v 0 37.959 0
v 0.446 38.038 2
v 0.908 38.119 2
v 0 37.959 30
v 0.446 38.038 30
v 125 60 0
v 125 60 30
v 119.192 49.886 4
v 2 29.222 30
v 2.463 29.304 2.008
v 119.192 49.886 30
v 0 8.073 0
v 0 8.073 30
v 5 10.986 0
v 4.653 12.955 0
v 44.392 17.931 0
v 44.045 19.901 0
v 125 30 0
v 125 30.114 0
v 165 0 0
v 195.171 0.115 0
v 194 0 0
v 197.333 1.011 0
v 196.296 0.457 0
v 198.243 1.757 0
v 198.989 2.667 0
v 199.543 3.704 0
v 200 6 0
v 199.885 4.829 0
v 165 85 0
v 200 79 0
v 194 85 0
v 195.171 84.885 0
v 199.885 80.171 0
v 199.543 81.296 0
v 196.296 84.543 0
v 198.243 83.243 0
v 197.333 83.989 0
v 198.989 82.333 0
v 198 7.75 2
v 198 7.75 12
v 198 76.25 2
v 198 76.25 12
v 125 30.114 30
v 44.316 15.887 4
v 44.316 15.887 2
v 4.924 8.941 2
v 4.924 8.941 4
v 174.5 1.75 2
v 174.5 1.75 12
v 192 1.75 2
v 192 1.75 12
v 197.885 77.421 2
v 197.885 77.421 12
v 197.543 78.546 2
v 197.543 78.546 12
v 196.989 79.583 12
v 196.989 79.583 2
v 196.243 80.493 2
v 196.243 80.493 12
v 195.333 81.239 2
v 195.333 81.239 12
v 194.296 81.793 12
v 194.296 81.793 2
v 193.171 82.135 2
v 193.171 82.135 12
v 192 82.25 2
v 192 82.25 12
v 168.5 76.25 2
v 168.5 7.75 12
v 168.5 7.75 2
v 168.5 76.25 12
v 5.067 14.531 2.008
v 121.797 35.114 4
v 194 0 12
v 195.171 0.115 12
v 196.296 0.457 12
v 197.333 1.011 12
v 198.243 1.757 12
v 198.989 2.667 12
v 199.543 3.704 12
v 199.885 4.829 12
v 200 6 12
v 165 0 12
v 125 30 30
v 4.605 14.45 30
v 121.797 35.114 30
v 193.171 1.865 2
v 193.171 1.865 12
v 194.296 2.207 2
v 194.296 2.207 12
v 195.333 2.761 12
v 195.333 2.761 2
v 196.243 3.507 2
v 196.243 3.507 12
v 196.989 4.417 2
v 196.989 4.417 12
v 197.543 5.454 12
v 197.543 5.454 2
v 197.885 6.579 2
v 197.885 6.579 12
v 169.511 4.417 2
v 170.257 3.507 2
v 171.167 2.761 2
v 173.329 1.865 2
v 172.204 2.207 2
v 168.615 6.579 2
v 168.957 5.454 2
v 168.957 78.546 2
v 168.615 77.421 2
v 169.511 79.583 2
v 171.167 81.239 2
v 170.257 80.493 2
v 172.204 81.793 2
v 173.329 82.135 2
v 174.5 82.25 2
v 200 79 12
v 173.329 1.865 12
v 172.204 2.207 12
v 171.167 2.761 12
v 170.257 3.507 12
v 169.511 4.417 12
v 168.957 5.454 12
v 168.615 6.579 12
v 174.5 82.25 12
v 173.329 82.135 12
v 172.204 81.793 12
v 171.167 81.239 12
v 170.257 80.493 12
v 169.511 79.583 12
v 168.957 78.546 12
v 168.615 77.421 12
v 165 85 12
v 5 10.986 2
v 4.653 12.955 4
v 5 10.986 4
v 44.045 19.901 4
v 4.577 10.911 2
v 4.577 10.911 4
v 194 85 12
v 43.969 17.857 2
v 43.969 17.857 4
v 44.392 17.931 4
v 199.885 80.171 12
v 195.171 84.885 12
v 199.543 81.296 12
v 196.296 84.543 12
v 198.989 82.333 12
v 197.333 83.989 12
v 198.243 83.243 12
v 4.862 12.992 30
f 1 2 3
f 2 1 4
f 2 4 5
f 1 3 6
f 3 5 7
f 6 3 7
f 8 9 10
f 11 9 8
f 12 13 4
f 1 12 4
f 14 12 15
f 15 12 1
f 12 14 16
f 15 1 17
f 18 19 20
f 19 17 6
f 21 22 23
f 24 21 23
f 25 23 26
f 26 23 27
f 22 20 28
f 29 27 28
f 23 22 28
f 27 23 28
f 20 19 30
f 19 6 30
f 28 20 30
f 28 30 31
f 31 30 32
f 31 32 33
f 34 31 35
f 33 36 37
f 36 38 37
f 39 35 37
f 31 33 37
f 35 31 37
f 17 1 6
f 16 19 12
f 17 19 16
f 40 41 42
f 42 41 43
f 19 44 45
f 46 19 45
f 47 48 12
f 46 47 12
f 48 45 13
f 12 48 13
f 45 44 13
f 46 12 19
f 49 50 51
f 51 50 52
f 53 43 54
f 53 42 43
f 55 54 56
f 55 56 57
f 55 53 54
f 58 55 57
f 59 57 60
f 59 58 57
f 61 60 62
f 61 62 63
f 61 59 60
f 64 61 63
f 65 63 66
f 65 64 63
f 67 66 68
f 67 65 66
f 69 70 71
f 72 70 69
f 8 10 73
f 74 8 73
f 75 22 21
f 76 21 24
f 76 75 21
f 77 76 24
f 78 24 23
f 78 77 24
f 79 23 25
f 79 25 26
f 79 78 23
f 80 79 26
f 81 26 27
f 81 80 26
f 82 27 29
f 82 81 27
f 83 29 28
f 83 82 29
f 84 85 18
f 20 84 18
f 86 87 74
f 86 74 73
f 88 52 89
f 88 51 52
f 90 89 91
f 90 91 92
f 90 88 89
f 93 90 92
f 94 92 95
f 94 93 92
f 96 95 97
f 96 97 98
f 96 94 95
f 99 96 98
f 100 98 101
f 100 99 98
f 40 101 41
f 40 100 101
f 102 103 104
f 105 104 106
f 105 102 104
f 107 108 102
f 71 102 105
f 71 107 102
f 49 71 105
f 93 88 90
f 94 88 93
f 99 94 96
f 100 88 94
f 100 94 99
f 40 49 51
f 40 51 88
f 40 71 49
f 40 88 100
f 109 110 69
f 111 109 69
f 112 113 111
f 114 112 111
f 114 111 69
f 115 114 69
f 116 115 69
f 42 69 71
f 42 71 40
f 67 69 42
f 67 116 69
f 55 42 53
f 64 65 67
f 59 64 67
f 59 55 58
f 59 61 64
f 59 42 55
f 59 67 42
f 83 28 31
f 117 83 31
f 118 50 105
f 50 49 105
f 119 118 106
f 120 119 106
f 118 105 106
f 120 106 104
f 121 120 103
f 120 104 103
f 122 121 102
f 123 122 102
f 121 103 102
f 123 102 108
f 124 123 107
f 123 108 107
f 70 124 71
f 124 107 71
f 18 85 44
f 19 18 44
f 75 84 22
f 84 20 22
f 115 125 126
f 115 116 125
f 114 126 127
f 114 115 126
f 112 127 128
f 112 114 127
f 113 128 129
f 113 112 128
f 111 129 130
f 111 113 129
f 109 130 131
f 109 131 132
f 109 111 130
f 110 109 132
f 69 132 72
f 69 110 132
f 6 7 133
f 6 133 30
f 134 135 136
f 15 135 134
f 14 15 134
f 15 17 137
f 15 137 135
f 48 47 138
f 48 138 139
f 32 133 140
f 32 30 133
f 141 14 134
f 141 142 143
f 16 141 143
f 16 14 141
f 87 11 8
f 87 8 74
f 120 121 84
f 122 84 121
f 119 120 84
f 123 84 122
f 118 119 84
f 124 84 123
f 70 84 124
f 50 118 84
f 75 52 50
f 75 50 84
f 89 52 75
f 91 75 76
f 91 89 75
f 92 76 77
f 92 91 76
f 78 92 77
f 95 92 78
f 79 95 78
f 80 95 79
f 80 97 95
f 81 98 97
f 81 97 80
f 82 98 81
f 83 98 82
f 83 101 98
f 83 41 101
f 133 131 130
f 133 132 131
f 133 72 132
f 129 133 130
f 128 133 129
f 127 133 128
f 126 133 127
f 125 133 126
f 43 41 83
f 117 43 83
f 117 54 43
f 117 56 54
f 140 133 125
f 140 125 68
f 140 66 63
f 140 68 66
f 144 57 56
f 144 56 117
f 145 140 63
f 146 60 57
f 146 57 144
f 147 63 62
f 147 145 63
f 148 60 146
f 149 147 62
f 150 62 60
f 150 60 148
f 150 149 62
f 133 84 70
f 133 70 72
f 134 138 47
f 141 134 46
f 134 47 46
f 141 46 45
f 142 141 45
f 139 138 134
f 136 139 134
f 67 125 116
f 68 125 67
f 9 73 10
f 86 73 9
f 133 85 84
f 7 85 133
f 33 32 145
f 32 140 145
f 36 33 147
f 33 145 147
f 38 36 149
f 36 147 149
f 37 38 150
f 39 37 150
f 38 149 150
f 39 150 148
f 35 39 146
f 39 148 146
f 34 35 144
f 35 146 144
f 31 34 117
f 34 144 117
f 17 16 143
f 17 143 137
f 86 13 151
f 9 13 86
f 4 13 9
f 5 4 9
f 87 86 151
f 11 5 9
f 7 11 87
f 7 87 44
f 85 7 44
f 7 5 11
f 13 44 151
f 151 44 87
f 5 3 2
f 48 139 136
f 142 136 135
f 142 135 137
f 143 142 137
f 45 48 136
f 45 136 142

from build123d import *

# Parameters (mm, degrees)
ESQUISSE1_W              = 200
ESQUISSE1_H              = 85
BOSS_EXTRU_1_DEPTH       = 30
ENL_V_MAT_EXTRU_3_DEPTH  = 28
ESQUISSE3_W              = 35
ESQUISSE3_H              = 85
ENL_V_MAT_EXTRU_4_DEPTH  = 18
ESQUISSE4_W              = 29.5
ESQUISSE4_H              = 80.5
ENL_V_MAT_EXTRU_5_DEPTH  = 10
CHANFREIN1_SIZE2         = 40
CHANFREIN1_SIZE          = 18
ENL_V_MAT_EXTRU_18_DEPTH = 220.374109685
ENL_V_MAT_EXTRU_19_DEPTH = 220.374109685
CHANFREIN5_SIZE2         = 30
CHANFREIN5_SIZE          = 40
CHANFREIN6_SIZE2         = 25
CHANFREIN6_SIZE          = 40
ESQUISSE10_W             = 40
ESQUISSE10_H             = 2
ENL_V_MAT_EXTRU_20_DEPTH = 2
ENL_V_MAT_EXTRU_21_DEPTH = 4
CONG_6_R                 = 6
CONG_7_R                 = 6
CHANFREIN7_SIZE2         = 119
CHANFREIN7_SIZE          = 2
CHANFREIN8_SIZE          = 0.47
CHANFREIN8_SIZE_2        = 28


# Some blends are built 0.0001 mm under size
with BuildPart() as part:
    # Esquisse1 → Boss.-Extru.1 (new body)
    with BuildSketch(Plane.XY):
        with Locations((100, 42.5)):
            Rectangle(ESQUISSE1_W, ESQUISSE1_H)
    extrude(amount=BOSS_EXTRU_1_DEPTH)

    # Esquisse2 → Enlèv. mat.-Extru.3 (cut)
    with BuildSketch(Plane.XY.offset(30)):
        Polygon((119.192122608, 49.886058148), (121.796845273, 35.113941852), (4.604722665, 14.44980871), (2, 29.221925005), align=None)
    extrude(amount=-ENL_V_MAT_EXTRU_3_DEPTH, mode=Mode.SUBTRACT)

    # Esquisse3 → Enlèv. mat.-Extru.4 (cut)
    with BuildSketch(Plane.XY.offset(30)):
        with Locations((182.5, 42.5)):
            Rectangle(ESQUISSE3_W, ESQUISSE3_H)
    extrude(amount=-ENL_V_MAT_EXTRU_4_DEPTH, mode=Mode.SUBTRACT)

    # Esquisse4 → Enlèv. mat.-Extru.5 (cut)
    with BuildSketch(Plane.XY.offset(12)):
        with Locations((183.25, 42)):
            Rectangle(ESQUISSE4_W, ESQUISSE4_H)
    extrude(amount=-ENL_V_MAT_EXTRU_5_DEPTH, mode=Mode.SUBTRACT)

    # Chanfrein1
    chanfrein1_edges = [part.edges().sort_by_distance(p)[0] for p in [
        (165, 42.5, 30),
    ]]
    chanfrein1_side = [part.faces().sort_by_distance(p)[0] for p in [
        (165, 42.5, 29.64),
    ]]
    chamfer(chanfrein1_edges, length=CHANFREIN1_SIZE - 0.0001, length2=CHANFREIN1_SIZE2 - 0.0001, reference=chanfrein1_side[0])  # a hair under: the kernel refuses the full size

    # Esquisse7 → Enlèv. mat.-Extru.18 (cut, through all)
    with BuildSketch(Plane.XY.offset(30)):
        Polygon((0, 37.959127411), (125, 60), (125, 85), (0, 85), align=None)
    extrude(amount=-ENL_V_MAT_EXTRU_18_DEPTH, mode=Mode.SUBTRACT)

    # Esquisse9 → Enlèv. mat.-Extru.19 (cut, through all)
    with BuildSketch(Plane.XY.offset(30)):
        Polygon((125, 30.113941852), (0, 8.073069264), (0, 0), (125, 0), align=None)
    extrude(amount=-ENL_V_MAT_EXTRU_19_DEPTH, mode=Mode.SUBTRACT)

    # Chanfrein5
    chanfrein5_edges = [part.edges().sort_by_distance(p)[0] for p in [
        (125, 0, 15),
    ]]
    chanfrein5_side = [part.faces().sort_by_distance(p)[0] for p in [
        (125.6, 0, 15),
    ]]
    chamfer(chanfrein5_edges, length=CHANFREIN5_SIZE - 0.0001, length2=CHANFREIN5_SIZE2 - 0.0001, reference=chanfrein5_side[0])  # a hair under: the kernel refuses the full size

    # Chanfrein6
    chanfrein6_edges = [part.edges().sort_by_distance(p)[0] for p in [
        (125, 85, 15),
    ]]
    chanfrein6_side = [part.faces().sort_by_distance(p)[0] for p in [
        (125.5, 85, 15),
    ]]
    chamfer(chanfrein6_edges, length=CHANFREIN6_SIZE - 0.0001, length2=CHANFREIN6_SIZE2 - 0.0001, reference=chanfrein6_side[0])  # a hair under: the kernel refuses the full size

    # Esquisse10 → Enlèv. mat.-Extru.20 (cut)
    with BuildSketch(Plane(origin=(-1.380576153, 7.829636439, 0), x_dir=(0.9848077530122079, 0.17364817766693122, 0), z_dir=(0.17364817766693122, -0.9848077530122079, 0))):
        with Locations((26.401873766, 3)):
            Rectangle(ESQUISSE10_W, ESQUISSE10_H)
    extrude(amount=-ENL_V_MAT_EXTRU_20_DEPTH, mode=Mode.SUBTRACT)

    # Esquisse11 → Enlèv. mat.-Extru.21 (cut)
    with BuildSketch(Plane(origin=(0, 0, 0), x_dir=(-1, 0, 0), z_dir=(0, 0, -1))):
        Polygon((-5, 10.985557391), (-44.39231012, 17.931484498), (-44.045013765, 19.901100004), (-4.652703645, 12.955172897), align=None)
    extrude(amount=-ENL_V_MAT_EXTRU_21_DEPTH, mode=Mode.SUBTRACT)

    # Congé6
    cong_6_edges = [part.edges().sort_by_distance(p)[0] for p in [
        (198, 82.25, 7),
        (198, 1.75, 7),
        (168.5, 1.75, 7),
        (168.5, 82.25, 7),
    ]]
    fillet(cong_6_edges, radius=CONG_6_R)

    # Congé7
    cong_7_edges = [part.edges().sort_by_distance(p)[0] for p in [
        (200, 85, 6),
        (200, 0, 6),
    ]]
    fillet(cong_7_edges, radius=CONG_7_R)

    # Chanfrein7
    chanfrein7_edges = [part.edges().sort_by_distance(p)[0] for p in [
        (120.494483941, 42.5, 2),
    ]]
    chanfrein7_side = [part.faces().sort_by_distance(p)[0] for p in [
        (120.494483941, 42.5, 2.04),
    ]]
    chamfer(chanfrein7_edges, length=CHANFREIN7_SIZE - 0.0001, length2=CHANFREIN7_SIZE2 - 0.0001, reference=chanfrein7_side[0])  # a hair under: the kernel refuses the full size

    # Chanfrein8
    # the kernel refuses this chamfer: 28, 0.47 mm, written as the material it adds along each edge
    with BuildSketch(Plane(origin=(17.246244149, -57.243822257, 2), x_dir=(0.3939624540892155, 0.06946621004204875, -0.9164976979951431), z_dir=(-0.1736481776669307, 0.984807753012208, 0))) as chanfrein8_piece_1_section:
        Polygon((CHANFREIN8_SIZE * 0.400039959966, -CHANFREIN8_SIZE * 0.916497697995), (-CHANFREIN8_SIZE_2 * 0.916497697995, -CHANFREIN8_SIZE_2 * 0.400039959966), (0, 0), align=None)
    chanfrein8_piece_1 = extrude(amount=160.599241573, mode=Mode.PRIVATE)
    chanfrein8_piece_1 = split(chanfrein8_piece_1, bisect_by=Plane(origin=(0.668634618, 38.077025735, 2.989674186), z_dir=(0.17364817766693805, -0.9848077530122068, 0)), keep=Keep.TOP, mode=Mode.PRIVATE)
    chanfrein8_piece_1 = split(chanfrein8_piece_1, bisect_by=Plane(origin=(5.084858853, 13.03137352, 2.989674186), z_dir=(-0.17364817766693125, 0.9848077530122079, 0)), keep=Keep.TOP, mode=Mode.PRIVATE)
    add(chanfrein8_piece_1)


solid = part.part
